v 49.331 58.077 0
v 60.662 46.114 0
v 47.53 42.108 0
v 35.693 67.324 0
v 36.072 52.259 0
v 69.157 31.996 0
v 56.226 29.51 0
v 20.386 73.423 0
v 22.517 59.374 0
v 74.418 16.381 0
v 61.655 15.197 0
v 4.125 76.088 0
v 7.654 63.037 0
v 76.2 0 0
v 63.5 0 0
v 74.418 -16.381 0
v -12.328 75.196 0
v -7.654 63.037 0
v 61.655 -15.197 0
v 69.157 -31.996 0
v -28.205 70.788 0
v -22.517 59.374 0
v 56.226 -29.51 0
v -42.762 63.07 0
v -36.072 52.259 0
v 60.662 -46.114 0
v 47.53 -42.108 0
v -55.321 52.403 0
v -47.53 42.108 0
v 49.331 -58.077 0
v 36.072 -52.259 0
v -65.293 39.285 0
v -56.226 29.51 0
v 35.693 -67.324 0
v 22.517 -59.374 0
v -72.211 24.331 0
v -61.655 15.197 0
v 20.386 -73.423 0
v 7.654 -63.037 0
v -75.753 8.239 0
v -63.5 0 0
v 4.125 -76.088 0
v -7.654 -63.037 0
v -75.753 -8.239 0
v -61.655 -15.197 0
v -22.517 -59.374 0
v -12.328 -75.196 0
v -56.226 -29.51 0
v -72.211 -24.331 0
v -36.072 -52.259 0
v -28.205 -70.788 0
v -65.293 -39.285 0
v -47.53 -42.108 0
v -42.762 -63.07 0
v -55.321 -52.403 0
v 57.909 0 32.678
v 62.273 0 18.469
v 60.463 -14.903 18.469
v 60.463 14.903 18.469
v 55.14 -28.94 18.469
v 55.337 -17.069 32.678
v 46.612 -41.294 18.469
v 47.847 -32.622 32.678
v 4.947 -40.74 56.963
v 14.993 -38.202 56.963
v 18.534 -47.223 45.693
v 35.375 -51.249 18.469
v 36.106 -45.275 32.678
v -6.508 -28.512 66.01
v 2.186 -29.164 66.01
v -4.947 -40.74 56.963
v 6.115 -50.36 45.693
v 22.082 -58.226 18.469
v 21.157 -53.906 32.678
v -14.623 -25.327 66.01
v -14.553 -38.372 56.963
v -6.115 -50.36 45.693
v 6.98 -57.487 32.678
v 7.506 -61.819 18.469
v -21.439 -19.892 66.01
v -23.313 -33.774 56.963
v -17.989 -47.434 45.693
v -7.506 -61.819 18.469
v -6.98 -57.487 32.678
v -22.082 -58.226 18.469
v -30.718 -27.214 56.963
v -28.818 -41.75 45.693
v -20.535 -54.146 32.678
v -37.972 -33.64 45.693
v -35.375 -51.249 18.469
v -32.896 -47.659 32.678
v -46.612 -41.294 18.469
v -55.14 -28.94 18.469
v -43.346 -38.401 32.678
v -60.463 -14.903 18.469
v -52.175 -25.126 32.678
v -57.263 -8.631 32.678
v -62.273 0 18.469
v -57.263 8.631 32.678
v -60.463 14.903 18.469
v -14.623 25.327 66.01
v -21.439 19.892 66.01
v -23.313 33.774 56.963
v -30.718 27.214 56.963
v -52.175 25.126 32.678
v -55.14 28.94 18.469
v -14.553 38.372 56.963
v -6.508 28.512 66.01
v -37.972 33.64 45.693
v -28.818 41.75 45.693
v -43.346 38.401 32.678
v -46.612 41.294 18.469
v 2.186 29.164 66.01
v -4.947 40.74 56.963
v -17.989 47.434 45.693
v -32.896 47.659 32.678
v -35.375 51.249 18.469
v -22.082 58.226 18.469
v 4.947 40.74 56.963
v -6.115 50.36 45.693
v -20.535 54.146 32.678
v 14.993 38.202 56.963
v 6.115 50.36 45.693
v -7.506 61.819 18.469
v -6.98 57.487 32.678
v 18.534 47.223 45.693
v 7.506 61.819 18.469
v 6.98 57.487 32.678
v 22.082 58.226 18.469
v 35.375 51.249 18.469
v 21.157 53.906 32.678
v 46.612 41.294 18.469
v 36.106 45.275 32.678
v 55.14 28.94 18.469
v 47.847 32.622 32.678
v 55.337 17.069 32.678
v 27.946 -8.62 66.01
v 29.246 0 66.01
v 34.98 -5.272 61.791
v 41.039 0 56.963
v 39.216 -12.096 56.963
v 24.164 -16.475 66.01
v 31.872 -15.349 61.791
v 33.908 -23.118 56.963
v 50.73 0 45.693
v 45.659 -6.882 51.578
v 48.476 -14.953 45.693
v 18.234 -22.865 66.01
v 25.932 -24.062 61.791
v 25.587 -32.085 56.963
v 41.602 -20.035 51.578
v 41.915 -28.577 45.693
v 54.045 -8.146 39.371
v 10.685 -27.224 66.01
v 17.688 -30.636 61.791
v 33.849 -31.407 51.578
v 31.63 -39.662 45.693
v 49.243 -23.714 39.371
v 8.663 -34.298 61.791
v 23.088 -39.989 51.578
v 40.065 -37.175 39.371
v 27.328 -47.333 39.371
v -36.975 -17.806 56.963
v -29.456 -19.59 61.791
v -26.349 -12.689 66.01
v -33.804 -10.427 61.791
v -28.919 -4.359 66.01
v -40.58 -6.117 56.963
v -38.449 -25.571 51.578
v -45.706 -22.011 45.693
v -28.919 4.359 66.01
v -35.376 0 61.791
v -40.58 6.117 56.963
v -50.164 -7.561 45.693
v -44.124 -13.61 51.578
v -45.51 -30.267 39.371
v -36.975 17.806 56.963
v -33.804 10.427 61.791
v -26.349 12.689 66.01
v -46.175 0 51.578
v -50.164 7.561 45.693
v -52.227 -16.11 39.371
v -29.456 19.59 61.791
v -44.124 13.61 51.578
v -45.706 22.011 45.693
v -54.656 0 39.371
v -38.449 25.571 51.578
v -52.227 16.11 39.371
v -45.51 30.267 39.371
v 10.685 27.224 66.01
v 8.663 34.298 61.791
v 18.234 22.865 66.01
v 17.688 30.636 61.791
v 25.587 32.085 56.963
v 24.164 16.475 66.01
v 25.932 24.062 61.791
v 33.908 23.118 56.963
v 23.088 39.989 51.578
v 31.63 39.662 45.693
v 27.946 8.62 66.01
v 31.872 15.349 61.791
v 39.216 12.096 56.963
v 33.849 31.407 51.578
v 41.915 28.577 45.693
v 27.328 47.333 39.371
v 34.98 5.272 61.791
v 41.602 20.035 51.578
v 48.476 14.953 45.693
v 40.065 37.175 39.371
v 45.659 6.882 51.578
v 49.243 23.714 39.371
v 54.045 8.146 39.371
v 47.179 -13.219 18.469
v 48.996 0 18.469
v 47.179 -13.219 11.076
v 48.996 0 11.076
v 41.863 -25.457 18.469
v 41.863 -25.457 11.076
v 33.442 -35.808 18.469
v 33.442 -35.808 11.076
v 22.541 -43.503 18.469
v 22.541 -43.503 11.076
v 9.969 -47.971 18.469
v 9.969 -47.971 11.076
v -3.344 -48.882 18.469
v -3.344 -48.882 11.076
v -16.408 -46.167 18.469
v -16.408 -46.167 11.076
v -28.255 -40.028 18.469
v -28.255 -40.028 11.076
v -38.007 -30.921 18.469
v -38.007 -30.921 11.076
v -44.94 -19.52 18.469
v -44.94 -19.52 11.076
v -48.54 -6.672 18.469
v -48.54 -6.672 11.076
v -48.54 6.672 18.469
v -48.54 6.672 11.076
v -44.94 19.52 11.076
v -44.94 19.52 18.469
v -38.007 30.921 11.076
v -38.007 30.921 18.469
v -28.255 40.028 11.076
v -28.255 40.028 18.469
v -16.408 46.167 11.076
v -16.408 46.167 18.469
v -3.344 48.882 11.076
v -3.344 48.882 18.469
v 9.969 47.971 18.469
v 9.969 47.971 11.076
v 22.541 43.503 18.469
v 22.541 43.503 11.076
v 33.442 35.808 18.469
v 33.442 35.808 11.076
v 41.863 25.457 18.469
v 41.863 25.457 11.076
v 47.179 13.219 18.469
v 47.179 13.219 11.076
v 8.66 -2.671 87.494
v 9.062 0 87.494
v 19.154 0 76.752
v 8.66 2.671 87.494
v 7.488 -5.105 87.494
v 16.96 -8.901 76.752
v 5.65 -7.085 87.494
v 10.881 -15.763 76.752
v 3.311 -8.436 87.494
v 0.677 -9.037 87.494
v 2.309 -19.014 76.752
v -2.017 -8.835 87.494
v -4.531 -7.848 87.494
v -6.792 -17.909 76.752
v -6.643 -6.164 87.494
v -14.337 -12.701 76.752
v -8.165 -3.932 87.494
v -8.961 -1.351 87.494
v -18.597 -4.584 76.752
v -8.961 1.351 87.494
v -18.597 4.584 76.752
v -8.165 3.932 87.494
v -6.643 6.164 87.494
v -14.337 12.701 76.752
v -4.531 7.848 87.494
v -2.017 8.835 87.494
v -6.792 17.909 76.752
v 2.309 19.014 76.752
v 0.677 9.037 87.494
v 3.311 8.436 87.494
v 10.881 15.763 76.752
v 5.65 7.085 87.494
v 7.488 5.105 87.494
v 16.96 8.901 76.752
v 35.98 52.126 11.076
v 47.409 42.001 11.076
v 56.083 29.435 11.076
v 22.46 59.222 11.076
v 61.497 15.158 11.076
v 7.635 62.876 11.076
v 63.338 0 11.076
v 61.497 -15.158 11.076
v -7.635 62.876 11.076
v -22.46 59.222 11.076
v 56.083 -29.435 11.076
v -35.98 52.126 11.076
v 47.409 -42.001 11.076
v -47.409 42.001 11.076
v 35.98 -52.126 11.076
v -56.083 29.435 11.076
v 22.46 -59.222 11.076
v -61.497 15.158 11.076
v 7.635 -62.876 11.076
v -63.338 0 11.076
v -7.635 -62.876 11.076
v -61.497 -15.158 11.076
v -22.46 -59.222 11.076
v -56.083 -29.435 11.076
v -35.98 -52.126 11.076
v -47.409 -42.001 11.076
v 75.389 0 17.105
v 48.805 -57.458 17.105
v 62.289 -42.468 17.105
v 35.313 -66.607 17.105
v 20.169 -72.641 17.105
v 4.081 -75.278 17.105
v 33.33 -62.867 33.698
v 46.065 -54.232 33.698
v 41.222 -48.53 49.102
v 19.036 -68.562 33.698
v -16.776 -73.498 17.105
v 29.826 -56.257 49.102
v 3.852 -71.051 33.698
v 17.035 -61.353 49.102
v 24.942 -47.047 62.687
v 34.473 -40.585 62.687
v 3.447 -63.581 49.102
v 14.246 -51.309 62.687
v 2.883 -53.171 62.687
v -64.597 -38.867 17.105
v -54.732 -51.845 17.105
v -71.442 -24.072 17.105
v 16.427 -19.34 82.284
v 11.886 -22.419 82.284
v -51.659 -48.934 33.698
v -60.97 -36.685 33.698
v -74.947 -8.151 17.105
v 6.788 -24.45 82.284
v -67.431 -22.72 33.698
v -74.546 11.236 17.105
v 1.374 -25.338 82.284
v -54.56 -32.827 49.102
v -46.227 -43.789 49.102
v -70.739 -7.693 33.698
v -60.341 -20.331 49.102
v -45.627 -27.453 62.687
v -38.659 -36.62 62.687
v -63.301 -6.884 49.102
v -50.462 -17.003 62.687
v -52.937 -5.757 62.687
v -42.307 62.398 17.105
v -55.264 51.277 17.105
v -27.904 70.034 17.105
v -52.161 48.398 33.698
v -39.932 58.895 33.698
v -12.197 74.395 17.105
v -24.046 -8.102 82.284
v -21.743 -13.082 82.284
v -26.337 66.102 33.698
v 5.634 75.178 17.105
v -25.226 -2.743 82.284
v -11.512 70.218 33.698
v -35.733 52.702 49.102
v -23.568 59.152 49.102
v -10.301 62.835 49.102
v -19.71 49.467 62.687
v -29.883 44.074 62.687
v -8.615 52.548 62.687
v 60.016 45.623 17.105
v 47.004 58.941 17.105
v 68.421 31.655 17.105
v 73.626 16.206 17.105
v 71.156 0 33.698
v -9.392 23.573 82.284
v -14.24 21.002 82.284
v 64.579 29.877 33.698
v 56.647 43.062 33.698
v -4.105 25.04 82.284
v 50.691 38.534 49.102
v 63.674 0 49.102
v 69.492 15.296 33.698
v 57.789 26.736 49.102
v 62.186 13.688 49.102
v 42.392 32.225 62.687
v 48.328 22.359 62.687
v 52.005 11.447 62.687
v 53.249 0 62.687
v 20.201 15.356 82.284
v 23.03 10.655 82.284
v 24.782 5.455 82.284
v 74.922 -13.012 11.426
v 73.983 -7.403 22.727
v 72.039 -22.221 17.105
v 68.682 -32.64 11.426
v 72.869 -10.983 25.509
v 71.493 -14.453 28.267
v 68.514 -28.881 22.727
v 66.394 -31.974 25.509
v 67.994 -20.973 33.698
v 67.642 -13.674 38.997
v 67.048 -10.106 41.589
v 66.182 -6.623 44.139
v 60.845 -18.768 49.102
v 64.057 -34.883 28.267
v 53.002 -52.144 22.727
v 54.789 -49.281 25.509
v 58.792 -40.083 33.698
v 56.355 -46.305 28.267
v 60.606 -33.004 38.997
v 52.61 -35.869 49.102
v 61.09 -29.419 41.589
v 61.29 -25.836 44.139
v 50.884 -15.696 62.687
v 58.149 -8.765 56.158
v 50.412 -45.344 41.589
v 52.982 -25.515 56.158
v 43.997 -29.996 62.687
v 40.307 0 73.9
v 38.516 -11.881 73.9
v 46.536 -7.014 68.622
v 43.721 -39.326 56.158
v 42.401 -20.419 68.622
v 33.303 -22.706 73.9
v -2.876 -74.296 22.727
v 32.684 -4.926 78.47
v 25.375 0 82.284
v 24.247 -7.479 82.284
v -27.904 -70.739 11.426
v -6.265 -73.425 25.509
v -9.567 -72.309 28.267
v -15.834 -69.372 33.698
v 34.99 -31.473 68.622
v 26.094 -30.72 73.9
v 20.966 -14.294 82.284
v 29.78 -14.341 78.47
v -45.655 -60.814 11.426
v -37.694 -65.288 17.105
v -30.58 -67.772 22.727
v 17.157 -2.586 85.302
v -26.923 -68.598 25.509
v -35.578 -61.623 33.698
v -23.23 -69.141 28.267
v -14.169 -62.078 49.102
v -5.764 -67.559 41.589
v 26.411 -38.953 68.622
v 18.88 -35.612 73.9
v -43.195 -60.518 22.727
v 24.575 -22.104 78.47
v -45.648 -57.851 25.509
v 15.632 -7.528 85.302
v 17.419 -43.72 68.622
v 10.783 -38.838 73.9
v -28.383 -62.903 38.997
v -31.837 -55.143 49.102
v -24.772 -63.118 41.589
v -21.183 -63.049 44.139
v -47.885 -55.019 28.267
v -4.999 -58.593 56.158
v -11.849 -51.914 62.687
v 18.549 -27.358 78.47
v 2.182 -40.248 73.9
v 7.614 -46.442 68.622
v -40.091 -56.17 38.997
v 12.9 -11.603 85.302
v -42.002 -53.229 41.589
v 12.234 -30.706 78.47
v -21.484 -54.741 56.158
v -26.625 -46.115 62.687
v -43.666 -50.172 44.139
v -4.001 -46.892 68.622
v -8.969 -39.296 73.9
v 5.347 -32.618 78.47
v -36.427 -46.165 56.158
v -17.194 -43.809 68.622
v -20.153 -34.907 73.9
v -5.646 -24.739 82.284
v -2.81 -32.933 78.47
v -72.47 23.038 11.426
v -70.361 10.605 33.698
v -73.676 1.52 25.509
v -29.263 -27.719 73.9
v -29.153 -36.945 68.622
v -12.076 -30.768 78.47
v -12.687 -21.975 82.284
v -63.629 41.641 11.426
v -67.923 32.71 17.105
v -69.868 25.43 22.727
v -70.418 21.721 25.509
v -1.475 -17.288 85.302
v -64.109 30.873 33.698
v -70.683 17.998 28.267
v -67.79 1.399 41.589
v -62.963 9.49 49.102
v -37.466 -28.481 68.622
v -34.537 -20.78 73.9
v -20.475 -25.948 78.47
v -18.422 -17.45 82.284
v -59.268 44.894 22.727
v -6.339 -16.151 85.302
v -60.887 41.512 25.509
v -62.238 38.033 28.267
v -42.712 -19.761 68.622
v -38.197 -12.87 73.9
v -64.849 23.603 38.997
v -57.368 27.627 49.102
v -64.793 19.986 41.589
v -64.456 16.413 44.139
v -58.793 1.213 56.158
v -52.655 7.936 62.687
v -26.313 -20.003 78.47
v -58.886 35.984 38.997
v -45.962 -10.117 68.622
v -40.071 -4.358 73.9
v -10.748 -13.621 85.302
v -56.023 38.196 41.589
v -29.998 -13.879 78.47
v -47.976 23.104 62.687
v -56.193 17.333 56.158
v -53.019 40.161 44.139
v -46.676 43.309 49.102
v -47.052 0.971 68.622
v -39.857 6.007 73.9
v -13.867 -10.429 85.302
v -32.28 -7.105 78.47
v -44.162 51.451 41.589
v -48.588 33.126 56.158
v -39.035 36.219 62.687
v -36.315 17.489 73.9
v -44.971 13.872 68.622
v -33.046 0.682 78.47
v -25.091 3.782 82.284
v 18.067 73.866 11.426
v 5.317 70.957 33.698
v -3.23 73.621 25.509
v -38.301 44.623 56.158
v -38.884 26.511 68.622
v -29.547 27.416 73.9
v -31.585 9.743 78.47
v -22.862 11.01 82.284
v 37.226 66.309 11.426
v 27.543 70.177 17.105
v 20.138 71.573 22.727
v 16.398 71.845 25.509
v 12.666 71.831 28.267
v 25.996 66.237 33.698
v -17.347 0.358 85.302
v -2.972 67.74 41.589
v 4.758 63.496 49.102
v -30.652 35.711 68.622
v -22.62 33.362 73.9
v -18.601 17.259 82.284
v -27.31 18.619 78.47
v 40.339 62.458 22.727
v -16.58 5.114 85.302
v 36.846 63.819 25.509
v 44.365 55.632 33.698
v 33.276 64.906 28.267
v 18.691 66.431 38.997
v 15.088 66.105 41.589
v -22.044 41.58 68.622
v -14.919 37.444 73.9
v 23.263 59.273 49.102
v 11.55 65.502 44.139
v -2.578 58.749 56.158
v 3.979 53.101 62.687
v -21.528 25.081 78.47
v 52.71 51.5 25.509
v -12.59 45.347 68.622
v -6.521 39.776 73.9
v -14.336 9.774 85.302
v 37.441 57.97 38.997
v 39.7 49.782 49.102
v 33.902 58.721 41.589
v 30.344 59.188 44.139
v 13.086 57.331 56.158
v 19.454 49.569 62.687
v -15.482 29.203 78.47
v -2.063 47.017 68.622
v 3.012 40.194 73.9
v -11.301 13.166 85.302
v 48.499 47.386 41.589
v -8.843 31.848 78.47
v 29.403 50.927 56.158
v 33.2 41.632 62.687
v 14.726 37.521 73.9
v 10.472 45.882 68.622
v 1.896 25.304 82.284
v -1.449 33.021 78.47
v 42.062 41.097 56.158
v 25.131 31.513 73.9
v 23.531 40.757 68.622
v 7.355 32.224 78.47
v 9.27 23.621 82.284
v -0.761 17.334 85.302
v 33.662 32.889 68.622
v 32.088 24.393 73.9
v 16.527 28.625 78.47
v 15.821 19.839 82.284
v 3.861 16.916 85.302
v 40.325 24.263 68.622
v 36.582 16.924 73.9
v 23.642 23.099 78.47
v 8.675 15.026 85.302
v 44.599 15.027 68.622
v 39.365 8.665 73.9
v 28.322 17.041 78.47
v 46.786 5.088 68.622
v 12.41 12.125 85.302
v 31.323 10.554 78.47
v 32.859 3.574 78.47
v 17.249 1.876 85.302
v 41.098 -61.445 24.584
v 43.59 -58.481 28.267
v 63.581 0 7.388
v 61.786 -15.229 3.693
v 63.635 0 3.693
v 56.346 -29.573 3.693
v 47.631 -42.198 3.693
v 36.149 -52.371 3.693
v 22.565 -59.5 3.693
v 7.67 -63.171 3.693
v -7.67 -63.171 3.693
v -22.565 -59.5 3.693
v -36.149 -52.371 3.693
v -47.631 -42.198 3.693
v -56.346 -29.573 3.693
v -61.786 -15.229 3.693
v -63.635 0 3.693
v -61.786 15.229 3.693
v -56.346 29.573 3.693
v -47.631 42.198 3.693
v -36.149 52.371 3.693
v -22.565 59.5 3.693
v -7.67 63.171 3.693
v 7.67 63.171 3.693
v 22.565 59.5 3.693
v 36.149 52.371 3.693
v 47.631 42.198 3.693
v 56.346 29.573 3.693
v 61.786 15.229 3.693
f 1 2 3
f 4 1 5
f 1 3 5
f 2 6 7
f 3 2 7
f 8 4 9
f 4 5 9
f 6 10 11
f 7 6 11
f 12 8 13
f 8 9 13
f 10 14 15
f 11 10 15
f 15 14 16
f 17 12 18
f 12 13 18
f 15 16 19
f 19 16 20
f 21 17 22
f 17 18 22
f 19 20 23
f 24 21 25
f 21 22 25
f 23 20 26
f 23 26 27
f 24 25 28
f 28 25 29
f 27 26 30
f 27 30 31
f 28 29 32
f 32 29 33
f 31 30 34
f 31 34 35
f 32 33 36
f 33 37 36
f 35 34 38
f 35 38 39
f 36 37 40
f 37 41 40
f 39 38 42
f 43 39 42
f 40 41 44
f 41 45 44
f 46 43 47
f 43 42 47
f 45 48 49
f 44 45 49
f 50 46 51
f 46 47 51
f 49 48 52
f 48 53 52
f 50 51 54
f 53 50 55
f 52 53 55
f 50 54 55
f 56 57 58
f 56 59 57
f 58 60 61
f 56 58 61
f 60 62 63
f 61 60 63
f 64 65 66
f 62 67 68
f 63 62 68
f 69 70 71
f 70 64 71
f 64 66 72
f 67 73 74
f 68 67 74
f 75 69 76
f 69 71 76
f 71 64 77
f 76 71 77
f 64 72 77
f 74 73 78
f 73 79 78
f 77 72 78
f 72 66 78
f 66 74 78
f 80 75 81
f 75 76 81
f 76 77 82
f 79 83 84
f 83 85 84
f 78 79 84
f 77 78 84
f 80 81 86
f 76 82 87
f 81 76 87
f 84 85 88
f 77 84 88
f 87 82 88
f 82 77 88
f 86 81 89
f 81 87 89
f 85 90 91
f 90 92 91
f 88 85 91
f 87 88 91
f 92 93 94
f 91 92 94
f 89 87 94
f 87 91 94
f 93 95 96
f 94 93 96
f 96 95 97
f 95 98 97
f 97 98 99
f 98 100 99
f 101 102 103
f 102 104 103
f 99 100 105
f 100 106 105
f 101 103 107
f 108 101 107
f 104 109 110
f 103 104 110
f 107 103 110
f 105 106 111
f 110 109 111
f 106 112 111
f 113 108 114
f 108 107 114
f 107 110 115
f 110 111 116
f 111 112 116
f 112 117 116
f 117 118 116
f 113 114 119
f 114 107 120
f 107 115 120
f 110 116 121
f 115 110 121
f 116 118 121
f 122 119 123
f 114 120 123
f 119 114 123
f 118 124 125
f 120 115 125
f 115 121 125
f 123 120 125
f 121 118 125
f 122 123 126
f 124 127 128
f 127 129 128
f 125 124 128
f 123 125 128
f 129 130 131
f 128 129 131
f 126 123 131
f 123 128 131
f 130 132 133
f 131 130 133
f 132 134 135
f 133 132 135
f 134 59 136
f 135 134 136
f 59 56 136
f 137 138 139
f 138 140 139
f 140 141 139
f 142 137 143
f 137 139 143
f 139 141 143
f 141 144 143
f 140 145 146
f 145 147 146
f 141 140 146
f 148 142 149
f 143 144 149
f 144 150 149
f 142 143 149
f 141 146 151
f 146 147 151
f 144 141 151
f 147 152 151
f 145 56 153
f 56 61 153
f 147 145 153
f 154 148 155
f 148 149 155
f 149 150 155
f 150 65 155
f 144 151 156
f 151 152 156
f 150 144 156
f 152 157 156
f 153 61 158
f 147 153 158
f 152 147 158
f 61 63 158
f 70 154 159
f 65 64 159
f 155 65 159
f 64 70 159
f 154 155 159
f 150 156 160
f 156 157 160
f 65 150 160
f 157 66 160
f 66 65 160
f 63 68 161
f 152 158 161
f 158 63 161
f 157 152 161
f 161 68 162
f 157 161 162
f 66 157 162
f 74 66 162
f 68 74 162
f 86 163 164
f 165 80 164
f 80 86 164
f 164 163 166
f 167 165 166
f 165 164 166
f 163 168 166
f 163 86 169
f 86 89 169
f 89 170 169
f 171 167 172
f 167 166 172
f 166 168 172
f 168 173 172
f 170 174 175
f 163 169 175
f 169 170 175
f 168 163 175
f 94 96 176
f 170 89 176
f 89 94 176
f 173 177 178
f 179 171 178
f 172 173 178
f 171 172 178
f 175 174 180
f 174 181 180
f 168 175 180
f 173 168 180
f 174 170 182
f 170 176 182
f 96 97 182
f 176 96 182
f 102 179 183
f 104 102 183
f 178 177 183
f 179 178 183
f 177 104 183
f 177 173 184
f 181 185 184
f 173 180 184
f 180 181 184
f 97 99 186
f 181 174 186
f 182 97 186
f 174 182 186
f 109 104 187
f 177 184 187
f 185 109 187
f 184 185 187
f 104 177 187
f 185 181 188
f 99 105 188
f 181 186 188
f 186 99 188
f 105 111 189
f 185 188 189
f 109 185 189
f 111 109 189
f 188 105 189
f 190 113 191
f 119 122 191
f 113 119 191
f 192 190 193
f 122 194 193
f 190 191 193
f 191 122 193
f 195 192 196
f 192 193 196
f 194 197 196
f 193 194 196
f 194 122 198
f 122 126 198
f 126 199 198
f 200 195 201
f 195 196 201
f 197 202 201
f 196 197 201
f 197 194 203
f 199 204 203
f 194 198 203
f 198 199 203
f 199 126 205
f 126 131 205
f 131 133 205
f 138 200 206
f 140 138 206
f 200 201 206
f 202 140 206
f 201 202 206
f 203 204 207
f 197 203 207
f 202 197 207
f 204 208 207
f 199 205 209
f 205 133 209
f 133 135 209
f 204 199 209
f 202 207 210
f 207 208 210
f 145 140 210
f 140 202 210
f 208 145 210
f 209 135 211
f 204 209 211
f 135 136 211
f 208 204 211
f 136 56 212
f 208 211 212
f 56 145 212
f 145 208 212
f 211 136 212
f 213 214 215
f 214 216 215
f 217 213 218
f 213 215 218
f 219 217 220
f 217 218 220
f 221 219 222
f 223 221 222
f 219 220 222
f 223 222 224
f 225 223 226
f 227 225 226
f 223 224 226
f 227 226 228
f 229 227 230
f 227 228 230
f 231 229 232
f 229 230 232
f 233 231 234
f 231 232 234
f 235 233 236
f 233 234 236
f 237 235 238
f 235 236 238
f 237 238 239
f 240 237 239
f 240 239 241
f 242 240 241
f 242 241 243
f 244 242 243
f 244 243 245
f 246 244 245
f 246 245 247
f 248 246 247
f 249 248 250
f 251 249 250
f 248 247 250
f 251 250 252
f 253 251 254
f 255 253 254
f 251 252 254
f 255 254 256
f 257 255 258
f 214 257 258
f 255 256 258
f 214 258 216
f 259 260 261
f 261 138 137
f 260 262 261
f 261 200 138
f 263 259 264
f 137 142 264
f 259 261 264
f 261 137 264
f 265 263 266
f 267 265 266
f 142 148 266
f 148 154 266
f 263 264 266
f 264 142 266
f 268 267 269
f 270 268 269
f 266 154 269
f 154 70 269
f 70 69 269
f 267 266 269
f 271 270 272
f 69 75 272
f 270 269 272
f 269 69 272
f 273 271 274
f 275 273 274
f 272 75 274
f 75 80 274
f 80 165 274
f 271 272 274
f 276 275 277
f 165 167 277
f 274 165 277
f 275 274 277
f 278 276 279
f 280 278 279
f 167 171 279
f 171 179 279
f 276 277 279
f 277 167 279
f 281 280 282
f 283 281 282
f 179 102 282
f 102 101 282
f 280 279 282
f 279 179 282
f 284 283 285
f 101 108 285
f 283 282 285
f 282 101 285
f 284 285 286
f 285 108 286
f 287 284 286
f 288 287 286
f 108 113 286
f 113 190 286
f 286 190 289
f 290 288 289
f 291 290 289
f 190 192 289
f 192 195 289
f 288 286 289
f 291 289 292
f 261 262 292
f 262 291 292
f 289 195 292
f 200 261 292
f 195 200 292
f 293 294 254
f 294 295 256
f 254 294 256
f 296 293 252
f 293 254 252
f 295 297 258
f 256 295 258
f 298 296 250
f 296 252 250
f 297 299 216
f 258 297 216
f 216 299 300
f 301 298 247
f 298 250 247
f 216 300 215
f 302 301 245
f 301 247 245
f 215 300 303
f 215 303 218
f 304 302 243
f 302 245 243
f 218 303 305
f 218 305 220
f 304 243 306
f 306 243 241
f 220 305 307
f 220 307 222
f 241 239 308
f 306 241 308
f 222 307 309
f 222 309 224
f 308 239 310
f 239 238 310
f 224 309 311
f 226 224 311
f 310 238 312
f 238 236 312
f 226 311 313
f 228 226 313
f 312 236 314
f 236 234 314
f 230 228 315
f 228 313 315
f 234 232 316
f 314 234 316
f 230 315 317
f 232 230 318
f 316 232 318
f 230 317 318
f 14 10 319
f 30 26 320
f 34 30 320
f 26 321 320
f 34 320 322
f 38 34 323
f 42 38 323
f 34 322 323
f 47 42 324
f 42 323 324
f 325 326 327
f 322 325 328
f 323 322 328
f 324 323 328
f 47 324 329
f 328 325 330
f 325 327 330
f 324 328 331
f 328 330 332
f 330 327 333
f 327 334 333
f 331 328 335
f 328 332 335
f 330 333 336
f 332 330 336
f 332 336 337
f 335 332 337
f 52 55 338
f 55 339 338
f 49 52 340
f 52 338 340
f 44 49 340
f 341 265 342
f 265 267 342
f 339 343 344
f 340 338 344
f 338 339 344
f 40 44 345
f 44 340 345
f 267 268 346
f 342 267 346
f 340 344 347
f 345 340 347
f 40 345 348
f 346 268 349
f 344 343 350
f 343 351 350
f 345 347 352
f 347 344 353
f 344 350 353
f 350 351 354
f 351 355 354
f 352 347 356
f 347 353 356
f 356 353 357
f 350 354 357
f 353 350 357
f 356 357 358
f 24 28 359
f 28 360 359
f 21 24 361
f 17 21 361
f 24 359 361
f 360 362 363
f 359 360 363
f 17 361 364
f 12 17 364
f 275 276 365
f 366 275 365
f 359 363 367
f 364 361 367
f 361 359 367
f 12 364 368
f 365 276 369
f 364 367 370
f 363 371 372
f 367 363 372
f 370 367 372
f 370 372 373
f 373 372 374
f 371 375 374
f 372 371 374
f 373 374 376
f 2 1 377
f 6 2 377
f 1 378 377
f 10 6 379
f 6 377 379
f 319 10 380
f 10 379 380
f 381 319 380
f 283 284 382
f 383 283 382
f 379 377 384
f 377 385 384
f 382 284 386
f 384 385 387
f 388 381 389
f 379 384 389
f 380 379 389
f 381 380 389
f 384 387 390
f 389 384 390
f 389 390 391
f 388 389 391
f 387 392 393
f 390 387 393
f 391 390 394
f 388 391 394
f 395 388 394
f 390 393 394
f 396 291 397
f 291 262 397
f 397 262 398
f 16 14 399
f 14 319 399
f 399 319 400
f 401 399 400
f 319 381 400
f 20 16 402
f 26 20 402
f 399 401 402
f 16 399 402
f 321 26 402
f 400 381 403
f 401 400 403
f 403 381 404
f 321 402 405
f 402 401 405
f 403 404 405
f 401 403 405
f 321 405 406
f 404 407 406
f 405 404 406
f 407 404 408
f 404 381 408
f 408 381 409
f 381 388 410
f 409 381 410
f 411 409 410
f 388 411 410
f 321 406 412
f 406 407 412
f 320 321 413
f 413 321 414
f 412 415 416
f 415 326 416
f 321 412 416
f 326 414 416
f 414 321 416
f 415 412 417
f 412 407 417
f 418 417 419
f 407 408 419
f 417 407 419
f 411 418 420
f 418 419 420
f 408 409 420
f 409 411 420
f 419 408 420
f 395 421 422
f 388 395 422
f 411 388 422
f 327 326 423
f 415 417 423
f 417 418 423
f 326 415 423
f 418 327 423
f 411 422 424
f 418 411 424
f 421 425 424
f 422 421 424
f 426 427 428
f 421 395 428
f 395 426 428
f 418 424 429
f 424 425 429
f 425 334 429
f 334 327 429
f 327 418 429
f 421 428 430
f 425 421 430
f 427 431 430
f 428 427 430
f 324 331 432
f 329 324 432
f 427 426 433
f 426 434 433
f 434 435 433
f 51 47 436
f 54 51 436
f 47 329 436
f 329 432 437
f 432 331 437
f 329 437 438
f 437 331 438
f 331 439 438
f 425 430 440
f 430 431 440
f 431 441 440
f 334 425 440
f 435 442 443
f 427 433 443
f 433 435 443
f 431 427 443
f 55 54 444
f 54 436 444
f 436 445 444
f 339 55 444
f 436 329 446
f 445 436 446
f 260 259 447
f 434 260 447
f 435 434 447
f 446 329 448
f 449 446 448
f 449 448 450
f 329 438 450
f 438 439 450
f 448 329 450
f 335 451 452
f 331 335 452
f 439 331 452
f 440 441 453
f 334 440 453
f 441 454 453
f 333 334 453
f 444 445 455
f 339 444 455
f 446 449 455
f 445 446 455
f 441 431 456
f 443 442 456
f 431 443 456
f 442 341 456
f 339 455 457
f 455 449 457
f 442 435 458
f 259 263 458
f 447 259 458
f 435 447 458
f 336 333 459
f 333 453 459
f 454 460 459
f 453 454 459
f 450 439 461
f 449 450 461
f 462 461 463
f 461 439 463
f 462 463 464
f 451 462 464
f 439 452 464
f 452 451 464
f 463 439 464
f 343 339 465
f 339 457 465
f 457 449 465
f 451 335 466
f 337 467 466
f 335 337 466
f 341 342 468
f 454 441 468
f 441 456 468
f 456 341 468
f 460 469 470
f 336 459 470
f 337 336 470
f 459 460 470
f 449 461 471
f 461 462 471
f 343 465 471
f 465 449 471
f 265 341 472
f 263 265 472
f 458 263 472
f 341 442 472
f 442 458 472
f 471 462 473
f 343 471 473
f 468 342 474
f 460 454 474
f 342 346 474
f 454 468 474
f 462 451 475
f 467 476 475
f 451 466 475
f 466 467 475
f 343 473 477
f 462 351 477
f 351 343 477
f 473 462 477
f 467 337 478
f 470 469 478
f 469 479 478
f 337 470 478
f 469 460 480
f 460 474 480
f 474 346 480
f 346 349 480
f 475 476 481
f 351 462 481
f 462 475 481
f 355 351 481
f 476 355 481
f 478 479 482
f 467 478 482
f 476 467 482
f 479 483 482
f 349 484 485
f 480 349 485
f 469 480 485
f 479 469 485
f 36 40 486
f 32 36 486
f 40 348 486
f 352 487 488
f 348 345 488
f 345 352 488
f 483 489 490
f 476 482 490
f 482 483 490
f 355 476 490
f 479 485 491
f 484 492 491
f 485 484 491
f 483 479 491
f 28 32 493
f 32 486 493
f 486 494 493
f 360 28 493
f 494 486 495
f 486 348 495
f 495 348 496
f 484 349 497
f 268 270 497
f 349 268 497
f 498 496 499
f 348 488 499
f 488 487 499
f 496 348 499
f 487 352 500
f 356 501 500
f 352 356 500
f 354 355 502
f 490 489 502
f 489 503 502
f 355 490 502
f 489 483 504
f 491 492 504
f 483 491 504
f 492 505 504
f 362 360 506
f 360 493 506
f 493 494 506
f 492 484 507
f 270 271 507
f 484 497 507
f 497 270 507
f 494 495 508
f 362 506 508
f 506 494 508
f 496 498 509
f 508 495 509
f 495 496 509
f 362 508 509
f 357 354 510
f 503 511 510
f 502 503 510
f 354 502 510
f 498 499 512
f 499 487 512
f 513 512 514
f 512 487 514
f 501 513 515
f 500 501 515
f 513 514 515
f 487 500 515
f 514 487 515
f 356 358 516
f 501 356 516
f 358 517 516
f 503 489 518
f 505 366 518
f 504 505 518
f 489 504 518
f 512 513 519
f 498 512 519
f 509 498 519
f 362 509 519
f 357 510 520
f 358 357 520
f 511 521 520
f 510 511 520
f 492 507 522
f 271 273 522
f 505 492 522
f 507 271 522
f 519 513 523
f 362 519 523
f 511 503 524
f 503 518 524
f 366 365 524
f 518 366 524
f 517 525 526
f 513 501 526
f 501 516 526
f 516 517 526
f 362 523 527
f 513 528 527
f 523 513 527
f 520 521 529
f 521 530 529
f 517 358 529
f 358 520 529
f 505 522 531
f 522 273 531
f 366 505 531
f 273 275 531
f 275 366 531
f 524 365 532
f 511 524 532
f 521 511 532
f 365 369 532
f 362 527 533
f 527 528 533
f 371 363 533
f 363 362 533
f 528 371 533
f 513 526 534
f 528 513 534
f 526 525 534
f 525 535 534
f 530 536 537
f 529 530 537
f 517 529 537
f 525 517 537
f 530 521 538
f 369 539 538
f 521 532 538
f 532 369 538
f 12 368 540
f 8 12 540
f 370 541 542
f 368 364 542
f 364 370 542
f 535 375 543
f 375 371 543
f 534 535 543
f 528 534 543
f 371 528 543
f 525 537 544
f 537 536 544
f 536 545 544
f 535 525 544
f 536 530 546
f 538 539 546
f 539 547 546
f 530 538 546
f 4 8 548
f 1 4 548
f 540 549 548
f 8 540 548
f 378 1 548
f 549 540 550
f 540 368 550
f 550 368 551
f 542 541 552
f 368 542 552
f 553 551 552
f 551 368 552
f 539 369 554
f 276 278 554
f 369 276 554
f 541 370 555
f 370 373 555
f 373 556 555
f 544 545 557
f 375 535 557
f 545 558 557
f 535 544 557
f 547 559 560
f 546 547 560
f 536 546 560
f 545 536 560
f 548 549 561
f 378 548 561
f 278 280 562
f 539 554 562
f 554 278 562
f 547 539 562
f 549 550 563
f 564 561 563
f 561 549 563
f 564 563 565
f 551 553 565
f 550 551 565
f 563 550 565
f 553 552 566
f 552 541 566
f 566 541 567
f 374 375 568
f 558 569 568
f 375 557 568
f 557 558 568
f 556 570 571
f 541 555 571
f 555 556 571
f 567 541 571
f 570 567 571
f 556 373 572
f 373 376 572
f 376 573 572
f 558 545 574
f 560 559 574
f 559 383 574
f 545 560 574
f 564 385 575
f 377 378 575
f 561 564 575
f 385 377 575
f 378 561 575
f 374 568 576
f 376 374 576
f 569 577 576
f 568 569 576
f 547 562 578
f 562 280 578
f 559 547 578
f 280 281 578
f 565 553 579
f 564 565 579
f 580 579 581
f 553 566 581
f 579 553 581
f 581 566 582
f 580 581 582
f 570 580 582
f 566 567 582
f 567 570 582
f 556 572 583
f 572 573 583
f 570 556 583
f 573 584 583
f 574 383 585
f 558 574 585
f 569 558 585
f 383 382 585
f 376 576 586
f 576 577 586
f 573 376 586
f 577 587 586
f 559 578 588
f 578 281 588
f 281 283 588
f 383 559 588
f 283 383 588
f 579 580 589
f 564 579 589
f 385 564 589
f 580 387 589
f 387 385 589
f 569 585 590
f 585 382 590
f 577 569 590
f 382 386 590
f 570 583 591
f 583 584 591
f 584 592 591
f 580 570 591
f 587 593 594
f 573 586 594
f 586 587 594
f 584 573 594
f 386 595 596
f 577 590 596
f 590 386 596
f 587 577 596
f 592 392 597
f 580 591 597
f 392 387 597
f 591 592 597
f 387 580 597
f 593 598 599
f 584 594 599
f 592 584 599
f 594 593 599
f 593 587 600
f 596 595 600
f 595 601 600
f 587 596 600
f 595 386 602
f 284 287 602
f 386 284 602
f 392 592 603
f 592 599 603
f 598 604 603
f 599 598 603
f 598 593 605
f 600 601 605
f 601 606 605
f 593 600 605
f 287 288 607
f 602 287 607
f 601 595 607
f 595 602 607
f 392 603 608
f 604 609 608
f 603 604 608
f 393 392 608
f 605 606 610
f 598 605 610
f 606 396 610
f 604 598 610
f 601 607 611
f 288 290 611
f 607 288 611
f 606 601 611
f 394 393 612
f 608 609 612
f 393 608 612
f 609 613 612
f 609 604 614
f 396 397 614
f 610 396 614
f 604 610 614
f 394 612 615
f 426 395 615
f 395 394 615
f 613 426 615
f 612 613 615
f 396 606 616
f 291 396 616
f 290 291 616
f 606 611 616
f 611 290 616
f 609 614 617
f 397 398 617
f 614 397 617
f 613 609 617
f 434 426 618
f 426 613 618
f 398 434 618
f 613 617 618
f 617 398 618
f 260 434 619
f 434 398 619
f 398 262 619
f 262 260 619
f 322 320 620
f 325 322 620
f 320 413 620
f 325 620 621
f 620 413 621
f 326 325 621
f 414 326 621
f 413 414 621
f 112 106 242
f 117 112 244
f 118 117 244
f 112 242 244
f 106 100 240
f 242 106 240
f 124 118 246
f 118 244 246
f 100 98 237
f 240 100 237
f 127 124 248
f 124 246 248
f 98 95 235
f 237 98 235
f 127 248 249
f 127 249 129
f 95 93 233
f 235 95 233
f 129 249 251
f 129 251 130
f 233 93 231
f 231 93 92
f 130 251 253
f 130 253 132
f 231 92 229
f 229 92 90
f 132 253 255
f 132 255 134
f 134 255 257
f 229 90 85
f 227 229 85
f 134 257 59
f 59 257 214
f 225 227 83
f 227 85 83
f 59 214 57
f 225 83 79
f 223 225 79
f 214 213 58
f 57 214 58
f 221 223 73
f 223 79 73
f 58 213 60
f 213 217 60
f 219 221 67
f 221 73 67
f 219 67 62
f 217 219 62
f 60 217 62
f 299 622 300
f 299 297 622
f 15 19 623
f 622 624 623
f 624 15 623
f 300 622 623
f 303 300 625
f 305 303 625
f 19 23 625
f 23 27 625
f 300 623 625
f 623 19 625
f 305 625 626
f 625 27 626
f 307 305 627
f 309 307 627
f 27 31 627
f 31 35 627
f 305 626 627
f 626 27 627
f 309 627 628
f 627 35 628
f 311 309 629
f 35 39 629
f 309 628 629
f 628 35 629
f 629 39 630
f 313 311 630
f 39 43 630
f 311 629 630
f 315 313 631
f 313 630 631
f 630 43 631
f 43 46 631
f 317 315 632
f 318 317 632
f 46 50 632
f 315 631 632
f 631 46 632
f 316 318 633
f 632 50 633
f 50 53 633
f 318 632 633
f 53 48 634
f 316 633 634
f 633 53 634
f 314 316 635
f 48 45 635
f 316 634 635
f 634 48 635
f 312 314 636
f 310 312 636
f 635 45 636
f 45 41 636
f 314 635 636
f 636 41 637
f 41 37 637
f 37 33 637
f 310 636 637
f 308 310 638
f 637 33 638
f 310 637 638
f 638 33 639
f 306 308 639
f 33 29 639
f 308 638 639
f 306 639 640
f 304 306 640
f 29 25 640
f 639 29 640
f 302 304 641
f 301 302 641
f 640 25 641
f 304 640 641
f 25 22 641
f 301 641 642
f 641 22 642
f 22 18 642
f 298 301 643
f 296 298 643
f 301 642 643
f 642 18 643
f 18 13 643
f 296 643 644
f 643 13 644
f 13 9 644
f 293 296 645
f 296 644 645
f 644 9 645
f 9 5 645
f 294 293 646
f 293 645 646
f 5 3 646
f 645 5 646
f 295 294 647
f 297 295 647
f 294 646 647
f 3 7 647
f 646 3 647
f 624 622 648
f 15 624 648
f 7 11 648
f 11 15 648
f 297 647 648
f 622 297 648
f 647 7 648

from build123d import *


with BuildPart() as f1:
    # F0 (on Front) → F1 (revolve)
    with BuildSketch(Plane.XZ):
        with BuildLine():
            ThreePointArc((63.337942, 11.075571), (63.631599, 5.540897), (63.5, 0))
            Line((63.5, 0), (76.2, 0))
            ThreePointArc((76.2, 0), (58.805768, 56.158465), (9.062436, 87.494281))
            Line((9.062436, 87.494281), (29.245666, 66.010336))
            ThreePointArc((29.245666, 66.010336), (50.730226, 45.692913), (62.272586, 18.468698))
            Line((62.272586, 18.468698), (48.995863, 18.468698))
            Line((48.995863, 18.468698), (48.995863, 11.075571))
            Line((48.995863, 11.075571), (63.337942, 11.075571))
        make_face()
    revolve(axis=Axis((0, 0, 82.55), (0, 0, -1)))


solid = f1.part
